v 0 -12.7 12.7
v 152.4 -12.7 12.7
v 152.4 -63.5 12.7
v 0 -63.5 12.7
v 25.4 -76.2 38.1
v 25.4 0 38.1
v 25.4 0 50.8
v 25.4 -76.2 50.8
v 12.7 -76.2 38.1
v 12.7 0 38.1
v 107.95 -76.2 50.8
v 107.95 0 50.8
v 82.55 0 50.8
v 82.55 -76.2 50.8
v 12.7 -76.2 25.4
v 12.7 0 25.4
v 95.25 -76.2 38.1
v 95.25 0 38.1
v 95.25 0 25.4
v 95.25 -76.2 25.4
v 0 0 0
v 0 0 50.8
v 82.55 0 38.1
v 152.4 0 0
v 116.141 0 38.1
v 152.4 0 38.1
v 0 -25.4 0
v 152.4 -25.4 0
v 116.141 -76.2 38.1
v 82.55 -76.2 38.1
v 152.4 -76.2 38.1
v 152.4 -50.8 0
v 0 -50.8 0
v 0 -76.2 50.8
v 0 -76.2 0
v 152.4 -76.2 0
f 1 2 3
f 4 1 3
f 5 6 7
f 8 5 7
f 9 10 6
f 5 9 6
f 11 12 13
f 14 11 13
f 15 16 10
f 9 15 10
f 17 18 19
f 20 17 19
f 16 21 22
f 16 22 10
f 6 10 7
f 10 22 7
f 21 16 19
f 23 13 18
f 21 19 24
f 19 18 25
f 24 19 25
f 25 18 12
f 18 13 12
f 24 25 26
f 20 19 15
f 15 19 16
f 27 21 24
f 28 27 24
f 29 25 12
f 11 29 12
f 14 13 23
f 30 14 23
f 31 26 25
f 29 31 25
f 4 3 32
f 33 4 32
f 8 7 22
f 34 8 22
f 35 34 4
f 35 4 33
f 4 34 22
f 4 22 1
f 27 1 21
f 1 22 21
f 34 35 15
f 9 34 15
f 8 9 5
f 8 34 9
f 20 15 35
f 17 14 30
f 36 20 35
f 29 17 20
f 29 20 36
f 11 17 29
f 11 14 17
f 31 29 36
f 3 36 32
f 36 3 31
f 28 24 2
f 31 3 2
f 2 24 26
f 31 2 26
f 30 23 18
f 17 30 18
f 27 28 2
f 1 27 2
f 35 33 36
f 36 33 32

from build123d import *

# Parameters (mm, degrees)
F1_DEPTH = 76.2
F3_DEPTH = 152.4


with BuildPart() as f1:
    # F0 (on Front) → F1 (new body)
    with BuildSketch(Plane.XZ):
        Polygon((0, 50.8), (0, 0), (152.4, 0), (152.4, 38.1), (116.141342, 38.1), (107.95, 50.8), (82.55, 50.8), (82.55, 38.1), (95.25, 38.1), (95.25, 25.4), (82.55, 25.4), (12.7, 25.4), (12.7, 38.1), (25.4, 38.1), (25.4, 50.8), align=None)
    extrude(amount=F1_DEPTH)

    # F2 (on face) → F3 (cut)
    with BuildSketch(Plane.YZ.offset(152.4)):
        Polygon((-12.7, 12.7), (-38.1, 12.7), (-63.5, 12.7), (-50.8, 0), (-25.4, 0), align=None)
    extrude(amount=-F3_DEPTH, mode=Mode.SUBTRACT)


solid = f1.part
